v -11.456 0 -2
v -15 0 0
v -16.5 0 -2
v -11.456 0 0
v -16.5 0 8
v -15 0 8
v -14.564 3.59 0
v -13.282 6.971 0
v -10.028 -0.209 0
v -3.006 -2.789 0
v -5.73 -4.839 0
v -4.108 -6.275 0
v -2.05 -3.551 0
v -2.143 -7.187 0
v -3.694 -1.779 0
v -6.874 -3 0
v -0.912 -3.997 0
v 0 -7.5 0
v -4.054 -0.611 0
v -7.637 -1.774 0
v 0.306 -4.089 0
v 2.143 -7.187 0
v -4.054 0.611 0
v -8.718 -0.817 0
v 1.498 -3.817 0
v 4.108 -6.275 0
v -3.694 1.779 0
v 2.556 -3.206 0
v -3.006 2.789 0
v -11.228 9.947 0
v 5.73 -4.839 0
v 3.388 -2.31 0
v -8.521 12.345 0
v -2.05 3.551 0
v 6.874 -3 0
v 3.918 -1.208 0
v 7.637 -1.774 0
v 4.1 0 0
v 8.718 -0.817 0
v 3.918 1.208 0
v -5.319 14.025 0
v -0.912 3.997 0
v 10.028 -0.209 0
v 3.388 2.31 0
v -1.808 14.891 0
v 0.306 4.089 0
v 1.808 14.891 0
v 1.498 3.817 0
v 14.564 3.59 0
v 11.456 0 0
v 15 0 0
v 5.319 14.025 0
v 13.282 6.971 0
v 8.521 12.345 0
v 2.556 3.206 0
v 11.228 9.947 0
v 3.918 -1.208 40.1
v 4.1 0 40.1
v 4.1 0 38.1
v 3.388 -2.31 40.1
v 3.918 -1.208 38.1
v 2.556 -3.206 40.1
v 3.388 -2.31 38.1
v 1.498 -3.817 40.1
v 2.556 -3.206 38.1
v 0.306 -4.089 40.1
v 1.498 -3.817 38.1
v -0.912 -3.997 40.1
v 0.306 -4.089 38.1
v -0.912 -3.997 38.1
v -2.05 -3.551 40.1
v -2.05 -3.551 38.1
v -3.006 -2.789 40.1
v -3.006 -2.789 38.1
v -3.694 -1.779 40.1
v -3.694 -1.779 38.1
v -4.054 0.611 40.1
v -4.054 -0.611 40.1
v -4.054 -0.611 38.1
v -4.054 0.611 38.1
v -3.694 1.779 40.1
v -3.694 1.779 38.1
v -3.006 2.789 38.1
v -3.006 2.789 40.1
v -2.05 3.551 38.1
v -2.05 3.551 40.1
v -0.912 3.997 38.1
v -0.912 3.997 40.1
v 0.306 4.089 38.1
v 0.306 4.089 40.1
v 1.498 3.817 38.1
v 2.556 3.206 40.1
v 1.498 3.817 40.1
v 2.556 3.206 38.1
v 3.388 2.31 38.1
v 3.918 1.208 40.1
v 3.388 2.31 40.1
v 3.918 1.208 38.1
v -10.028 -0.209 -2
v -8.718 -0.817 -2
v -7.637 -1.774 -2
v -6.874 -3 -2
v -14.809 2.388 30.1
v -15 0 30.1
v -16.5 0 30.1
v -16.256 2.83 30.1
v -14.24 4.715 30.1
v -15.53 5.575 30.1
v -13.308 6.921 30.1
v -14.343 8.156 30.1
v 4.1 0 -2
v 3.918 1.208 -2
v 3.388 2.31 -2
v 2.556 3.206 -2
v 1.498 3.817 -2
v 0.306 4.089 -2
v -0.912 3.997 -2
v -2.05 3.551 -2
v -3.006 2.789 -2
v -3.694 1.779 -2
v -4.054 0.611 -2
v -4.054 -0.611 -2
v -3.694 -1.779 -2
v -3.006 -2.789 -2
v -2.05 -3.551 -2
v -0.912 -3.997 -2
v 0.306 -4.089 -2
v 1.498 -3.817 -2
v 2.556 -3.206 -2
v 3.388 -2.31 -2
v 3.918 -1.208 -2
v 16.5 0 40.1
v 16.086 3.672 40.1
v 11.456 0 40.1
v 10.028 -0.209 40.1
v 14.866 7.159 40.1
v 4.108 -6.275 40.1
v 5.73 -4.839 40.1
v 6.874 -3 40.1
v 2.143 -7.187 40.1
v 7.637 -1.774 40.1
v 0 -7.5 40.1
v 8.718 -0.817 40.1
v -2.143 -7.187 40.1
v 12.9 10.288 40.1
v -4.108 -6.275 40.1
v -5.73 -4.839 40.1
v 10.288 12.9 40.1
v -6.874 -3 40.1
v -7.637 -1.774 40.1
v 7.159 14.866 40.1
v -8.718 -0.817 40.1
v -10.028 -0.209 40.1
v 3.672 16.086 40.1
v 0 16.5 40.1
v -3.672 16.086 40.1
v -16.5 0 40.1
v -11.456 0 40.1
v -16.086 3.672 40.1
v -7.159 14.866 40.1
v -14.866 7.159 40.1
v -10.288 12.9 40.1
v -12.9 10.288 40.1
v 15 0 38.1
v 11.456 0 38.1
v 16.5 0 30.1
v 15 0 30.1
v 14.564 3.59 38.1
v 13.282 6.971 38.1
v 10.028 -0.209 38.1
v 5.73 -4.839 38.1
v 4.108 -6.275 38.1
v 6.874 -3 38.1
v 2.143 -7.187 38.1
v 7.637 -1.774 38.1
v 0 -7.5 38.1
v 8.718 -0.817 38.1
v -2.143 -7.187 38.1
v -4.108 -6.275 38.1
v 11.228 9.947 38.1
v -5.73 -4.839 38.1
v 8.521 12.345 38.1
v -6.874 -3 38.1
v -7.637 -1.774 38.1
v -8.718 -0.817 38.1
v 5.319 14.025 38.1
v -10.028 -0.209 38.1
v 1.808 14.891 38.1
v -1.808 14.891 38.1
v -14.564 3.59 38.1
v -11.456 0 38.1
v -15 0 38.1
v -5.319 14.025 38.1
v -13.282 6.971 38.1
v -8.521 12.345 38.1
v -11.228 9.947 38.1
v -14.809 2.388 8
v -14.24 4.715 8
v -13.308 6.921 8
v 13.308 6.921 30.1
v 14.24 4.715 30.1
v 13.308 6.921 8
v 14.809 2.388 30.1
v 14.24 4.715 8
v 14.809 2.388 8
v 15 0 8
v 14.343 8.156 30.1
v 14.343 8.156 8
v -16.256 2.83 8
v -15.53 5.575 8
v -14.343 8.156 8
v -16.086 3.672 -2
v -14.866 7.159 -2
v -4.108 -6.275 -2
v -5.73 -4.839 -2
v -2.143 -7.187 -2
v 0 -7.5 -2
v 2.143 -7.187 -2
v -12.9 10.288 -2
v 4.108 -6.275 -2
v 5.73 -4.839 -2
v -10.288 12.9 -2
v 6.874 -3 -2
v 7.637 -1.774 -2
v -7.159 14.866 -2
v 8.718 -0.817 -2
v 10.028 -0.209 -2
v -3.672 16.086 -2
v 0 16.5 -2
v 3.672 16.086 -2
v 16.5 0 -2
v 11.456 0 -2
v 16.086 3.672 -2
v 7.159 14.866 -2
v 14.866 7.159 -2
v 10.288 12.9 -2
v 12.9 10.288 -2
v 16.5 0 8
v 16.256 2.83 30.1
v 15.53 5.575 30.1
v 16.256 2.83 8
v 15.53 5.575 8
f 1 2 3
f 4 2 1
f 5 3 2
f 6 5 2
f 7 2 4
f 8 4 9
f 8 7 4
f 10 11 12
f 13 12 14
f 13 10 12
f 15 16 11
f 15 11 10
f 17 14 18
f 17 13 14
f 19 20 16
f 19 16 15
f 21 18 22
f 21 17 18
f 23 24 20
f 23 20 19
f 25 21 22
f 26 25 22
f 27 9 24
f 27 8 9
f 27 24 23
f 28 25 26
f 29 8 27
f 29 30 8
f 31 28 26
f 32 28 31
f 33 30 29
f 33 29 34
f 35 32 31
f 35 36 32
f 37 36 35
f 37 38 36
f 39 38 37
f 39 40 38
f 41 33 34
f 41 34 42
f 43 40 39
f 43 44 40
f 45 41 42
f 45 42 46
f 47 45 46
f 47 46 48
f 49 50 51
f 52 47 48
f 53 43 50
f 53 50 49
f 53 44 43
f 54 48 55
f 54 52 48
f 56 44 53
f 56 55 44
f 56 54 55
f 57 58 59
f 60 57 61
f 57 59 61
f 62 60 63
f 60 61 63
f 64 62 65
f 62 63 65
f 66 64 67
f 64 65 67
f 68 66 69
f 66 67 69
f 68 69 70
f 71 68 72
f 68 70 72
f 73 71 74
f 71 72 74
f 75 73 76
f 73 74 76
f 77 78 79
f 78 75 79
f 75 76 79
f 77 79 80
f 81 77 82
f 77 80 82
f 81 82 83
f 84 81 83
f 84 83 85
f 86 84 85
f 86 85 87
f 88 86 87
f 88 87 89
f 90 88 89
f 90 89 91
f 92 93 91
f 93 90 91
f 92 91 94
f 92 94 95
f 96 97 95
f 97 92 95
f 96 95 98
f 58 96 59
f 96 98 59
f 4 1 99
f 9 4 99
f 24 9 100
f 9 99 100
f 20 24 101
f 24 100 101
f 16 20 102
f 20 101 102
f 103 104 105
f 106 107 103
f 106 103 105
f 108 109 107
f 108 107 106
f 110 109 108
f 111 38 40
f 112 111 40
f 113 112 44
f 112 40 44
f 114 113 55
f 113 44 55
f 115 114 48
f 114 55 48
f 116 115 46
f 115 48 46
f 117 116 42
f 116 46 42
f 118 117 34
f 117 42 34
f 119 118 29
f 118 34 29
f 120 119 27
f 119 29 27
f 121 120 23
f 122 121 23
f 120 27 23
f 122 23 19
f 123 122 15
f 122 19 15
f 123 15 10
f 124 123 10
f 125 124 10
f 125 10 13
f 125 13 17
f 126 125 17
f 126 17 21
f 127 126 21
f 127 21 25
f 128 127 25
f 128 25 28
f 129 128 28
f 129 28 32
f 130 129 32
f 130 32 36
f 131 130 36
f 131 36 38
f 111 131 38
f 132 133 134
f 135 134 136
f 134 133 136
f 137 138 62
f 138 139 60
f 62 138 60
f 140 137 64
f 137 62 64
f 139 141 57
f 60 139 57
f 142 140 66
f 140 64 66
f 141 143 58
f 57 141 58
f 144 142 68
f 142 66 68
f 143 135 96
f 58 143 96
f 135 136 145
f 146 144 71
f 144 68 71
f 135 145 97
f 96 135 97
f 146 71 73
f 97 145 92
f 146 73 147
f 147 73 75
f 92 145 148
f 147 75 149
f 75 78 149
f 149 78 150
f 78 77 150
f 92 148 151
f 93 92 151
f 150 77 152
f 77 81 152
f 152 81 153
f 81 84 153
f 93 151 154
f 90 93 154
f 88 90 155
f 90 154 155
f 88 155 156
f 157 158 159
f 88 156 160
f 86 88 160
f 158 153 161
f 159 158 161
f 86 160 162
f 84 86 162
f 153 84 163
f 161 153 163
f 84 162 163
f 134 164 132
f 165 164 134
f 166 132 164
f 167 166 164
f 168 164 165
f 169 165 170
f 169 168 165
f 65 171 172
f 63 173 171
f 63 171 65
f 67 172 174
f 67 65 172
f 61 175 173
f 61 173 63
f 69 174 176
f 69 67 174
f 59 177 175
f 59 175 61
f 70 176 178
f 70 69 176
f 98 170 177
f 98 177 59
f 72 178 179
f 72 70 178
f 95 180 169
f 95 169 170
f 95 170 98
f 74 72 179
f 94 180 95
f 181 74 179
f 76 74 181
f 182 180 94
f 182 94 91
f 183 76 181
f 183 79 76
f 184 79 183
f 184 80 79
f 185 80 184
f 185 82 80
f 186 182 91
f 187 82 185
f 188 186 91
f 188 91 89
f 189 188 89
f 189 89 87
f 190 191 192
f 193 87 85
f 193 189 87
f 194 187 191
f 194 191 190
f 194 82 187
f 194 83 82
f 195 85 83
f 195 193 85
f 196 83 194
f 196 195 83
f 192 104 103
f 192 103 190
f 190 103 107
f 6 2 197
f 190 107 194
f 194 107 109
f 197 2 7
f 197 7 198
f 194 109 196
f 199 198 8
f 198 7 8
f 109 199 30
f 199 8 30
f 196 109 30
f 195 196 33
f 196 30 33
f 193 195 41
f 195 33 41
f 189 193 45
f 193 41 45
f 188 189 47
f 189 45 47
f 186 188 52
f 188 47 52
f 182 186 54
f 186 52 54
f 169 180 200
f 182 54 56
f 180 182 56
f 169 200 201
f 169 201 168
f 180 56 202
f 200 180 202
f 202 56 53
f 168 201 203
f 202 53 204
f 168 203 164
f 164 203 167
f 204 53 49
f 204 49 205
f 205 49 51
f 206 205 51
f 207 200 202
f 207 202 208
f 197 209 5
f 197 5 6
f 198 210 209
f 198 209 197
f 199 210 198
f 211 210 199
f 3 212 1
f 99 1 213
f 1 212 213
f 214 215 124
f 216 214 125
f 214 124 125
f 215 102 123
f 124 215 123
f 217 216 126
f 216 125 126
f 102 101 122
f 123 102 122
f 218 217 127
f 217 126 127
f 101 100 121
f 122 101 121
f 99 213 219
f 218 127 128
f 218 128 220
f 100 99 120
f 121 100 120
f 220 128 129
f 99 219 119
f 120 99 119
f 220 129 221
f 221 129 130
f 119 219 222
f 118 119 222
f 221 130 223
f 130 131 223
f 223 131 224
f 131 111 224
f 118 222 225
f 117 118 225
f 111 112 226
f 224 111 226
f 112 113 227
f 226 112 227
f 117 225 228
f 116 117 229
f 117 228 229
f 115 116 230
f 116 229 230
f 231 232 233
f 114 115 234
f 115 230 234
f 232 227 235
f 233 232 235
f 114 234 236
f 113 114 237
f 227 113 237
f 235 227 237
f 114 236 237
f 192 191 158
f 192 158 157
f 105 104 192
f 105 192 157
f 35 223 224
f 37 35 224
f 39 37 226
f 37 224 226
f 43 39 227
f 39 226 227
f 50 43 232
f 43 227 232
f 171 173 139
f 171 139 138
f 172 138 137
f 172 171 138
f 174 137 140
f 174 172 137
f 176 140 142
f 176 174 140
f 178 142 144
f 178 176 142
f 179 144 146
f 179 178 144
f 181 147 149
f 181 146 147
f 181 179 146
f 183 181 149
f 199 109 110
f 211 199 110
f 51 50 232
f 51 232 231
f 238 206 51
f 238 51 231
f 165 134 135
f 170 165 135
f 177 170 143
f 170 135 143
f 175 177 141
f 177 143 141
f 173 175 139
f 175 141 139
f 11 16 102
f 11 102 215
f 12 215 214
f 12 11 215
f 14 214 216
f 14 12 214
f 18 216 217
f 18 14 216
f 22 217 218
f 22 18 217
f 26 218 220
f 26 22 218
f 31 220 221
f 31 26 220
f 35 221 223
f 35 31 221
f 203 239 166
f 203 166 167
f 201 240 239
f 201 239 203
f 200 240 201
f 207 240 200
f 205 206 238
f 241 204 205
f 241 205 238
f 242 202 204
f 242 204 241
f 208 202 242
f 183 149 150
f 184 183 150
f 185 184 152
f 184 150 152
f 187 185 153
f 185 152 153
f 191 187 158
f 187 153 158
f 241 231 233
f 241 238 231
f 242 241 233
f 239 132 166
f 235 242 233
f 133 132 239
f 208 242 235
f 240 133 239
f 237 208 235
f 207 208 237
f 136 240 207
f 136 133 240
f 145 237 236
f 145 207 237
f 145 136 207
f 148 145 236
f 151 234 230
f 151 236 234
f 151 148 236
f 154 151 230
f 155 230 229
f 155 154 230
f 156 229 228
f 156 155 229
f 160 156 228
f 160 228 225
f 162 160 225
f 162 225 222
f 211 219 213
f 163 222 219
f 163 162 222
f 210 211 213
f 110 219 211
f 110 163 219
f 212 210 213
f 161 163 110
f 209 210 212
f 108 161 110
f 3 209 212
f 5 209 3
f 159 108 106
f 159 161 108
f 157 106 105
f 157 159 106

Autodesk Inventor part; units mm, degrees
ref_plane "YZ Plane" through (0, 0, 0) normal (1, 0, 0) x (0, 1, 0)
ref_plane "XZ Plane" through (0, 0, 0) normal (0, 1, 0) x (-1, 0, 0)
ref_plane "XY Plane" through (0, 0, 0) normal (0, 0, 1) x (1, 0, 0)
sketch "Sketch1" plane through (0, 0, 0) normal (0, 0, 1) x (1, 0, 0)
  circle A0 centre (0, 0) radius 4.1
  circle A1 centre (0, 0) radius 15
  circle A2 centre (0, 0) radius 16.5
  line L0 (-16.5, 0) -> (16.5, 0)
  circle A3 centre (0, 0) radius 7.5
  line L1 (-7.5, 0) -> (-14.3434, 8.1557)
  line L2 (7.5, 0) -> (14.3434, 8.1557)
  point P0 (-15, 0)
  point P1 (15, 0)
  point P2 (13.3077, 6.9213)
  point P3 (-13.3077, 6.9213)
  dimension "d0" = 8.2
  dimension "d1" = 30
  dimension "d2" = 33
  dimension "d5" = 15
  dimension "d6" = 50
extrude "Extrusion1" add sketch "Sketch1" along normal blind 19.05 contours A1 L1 A2 L2
extrude "Extrusion2" add sketch "Sketch1" against normal blind 2 contours L0 A3 A0 | A0 L0 A3 | L2 A1 L0 | A3 L1 A1 L2 | L0 A1 L1 | A1 L2 A2 L0 | A1 L1 A2 L2 | L0 A2 L1 A1
extrude "Extrusion3" add sketch "Sketch1" along normal blind 8 contours A1 L2 A2 L0 | L0 A2 L1 A1
mirror "Mirror1" about plane through (0, 11.7107, 19.05) normal (0, 0, 1)
fillet "Fillet1" radius 5 4 edges at (-7.5, 0, -1) (7.5, 0, -1) (7.5, 0, 39.1) (-7.5, 0, 39.1)
properties part number "pulley_bearing_base_cover"
